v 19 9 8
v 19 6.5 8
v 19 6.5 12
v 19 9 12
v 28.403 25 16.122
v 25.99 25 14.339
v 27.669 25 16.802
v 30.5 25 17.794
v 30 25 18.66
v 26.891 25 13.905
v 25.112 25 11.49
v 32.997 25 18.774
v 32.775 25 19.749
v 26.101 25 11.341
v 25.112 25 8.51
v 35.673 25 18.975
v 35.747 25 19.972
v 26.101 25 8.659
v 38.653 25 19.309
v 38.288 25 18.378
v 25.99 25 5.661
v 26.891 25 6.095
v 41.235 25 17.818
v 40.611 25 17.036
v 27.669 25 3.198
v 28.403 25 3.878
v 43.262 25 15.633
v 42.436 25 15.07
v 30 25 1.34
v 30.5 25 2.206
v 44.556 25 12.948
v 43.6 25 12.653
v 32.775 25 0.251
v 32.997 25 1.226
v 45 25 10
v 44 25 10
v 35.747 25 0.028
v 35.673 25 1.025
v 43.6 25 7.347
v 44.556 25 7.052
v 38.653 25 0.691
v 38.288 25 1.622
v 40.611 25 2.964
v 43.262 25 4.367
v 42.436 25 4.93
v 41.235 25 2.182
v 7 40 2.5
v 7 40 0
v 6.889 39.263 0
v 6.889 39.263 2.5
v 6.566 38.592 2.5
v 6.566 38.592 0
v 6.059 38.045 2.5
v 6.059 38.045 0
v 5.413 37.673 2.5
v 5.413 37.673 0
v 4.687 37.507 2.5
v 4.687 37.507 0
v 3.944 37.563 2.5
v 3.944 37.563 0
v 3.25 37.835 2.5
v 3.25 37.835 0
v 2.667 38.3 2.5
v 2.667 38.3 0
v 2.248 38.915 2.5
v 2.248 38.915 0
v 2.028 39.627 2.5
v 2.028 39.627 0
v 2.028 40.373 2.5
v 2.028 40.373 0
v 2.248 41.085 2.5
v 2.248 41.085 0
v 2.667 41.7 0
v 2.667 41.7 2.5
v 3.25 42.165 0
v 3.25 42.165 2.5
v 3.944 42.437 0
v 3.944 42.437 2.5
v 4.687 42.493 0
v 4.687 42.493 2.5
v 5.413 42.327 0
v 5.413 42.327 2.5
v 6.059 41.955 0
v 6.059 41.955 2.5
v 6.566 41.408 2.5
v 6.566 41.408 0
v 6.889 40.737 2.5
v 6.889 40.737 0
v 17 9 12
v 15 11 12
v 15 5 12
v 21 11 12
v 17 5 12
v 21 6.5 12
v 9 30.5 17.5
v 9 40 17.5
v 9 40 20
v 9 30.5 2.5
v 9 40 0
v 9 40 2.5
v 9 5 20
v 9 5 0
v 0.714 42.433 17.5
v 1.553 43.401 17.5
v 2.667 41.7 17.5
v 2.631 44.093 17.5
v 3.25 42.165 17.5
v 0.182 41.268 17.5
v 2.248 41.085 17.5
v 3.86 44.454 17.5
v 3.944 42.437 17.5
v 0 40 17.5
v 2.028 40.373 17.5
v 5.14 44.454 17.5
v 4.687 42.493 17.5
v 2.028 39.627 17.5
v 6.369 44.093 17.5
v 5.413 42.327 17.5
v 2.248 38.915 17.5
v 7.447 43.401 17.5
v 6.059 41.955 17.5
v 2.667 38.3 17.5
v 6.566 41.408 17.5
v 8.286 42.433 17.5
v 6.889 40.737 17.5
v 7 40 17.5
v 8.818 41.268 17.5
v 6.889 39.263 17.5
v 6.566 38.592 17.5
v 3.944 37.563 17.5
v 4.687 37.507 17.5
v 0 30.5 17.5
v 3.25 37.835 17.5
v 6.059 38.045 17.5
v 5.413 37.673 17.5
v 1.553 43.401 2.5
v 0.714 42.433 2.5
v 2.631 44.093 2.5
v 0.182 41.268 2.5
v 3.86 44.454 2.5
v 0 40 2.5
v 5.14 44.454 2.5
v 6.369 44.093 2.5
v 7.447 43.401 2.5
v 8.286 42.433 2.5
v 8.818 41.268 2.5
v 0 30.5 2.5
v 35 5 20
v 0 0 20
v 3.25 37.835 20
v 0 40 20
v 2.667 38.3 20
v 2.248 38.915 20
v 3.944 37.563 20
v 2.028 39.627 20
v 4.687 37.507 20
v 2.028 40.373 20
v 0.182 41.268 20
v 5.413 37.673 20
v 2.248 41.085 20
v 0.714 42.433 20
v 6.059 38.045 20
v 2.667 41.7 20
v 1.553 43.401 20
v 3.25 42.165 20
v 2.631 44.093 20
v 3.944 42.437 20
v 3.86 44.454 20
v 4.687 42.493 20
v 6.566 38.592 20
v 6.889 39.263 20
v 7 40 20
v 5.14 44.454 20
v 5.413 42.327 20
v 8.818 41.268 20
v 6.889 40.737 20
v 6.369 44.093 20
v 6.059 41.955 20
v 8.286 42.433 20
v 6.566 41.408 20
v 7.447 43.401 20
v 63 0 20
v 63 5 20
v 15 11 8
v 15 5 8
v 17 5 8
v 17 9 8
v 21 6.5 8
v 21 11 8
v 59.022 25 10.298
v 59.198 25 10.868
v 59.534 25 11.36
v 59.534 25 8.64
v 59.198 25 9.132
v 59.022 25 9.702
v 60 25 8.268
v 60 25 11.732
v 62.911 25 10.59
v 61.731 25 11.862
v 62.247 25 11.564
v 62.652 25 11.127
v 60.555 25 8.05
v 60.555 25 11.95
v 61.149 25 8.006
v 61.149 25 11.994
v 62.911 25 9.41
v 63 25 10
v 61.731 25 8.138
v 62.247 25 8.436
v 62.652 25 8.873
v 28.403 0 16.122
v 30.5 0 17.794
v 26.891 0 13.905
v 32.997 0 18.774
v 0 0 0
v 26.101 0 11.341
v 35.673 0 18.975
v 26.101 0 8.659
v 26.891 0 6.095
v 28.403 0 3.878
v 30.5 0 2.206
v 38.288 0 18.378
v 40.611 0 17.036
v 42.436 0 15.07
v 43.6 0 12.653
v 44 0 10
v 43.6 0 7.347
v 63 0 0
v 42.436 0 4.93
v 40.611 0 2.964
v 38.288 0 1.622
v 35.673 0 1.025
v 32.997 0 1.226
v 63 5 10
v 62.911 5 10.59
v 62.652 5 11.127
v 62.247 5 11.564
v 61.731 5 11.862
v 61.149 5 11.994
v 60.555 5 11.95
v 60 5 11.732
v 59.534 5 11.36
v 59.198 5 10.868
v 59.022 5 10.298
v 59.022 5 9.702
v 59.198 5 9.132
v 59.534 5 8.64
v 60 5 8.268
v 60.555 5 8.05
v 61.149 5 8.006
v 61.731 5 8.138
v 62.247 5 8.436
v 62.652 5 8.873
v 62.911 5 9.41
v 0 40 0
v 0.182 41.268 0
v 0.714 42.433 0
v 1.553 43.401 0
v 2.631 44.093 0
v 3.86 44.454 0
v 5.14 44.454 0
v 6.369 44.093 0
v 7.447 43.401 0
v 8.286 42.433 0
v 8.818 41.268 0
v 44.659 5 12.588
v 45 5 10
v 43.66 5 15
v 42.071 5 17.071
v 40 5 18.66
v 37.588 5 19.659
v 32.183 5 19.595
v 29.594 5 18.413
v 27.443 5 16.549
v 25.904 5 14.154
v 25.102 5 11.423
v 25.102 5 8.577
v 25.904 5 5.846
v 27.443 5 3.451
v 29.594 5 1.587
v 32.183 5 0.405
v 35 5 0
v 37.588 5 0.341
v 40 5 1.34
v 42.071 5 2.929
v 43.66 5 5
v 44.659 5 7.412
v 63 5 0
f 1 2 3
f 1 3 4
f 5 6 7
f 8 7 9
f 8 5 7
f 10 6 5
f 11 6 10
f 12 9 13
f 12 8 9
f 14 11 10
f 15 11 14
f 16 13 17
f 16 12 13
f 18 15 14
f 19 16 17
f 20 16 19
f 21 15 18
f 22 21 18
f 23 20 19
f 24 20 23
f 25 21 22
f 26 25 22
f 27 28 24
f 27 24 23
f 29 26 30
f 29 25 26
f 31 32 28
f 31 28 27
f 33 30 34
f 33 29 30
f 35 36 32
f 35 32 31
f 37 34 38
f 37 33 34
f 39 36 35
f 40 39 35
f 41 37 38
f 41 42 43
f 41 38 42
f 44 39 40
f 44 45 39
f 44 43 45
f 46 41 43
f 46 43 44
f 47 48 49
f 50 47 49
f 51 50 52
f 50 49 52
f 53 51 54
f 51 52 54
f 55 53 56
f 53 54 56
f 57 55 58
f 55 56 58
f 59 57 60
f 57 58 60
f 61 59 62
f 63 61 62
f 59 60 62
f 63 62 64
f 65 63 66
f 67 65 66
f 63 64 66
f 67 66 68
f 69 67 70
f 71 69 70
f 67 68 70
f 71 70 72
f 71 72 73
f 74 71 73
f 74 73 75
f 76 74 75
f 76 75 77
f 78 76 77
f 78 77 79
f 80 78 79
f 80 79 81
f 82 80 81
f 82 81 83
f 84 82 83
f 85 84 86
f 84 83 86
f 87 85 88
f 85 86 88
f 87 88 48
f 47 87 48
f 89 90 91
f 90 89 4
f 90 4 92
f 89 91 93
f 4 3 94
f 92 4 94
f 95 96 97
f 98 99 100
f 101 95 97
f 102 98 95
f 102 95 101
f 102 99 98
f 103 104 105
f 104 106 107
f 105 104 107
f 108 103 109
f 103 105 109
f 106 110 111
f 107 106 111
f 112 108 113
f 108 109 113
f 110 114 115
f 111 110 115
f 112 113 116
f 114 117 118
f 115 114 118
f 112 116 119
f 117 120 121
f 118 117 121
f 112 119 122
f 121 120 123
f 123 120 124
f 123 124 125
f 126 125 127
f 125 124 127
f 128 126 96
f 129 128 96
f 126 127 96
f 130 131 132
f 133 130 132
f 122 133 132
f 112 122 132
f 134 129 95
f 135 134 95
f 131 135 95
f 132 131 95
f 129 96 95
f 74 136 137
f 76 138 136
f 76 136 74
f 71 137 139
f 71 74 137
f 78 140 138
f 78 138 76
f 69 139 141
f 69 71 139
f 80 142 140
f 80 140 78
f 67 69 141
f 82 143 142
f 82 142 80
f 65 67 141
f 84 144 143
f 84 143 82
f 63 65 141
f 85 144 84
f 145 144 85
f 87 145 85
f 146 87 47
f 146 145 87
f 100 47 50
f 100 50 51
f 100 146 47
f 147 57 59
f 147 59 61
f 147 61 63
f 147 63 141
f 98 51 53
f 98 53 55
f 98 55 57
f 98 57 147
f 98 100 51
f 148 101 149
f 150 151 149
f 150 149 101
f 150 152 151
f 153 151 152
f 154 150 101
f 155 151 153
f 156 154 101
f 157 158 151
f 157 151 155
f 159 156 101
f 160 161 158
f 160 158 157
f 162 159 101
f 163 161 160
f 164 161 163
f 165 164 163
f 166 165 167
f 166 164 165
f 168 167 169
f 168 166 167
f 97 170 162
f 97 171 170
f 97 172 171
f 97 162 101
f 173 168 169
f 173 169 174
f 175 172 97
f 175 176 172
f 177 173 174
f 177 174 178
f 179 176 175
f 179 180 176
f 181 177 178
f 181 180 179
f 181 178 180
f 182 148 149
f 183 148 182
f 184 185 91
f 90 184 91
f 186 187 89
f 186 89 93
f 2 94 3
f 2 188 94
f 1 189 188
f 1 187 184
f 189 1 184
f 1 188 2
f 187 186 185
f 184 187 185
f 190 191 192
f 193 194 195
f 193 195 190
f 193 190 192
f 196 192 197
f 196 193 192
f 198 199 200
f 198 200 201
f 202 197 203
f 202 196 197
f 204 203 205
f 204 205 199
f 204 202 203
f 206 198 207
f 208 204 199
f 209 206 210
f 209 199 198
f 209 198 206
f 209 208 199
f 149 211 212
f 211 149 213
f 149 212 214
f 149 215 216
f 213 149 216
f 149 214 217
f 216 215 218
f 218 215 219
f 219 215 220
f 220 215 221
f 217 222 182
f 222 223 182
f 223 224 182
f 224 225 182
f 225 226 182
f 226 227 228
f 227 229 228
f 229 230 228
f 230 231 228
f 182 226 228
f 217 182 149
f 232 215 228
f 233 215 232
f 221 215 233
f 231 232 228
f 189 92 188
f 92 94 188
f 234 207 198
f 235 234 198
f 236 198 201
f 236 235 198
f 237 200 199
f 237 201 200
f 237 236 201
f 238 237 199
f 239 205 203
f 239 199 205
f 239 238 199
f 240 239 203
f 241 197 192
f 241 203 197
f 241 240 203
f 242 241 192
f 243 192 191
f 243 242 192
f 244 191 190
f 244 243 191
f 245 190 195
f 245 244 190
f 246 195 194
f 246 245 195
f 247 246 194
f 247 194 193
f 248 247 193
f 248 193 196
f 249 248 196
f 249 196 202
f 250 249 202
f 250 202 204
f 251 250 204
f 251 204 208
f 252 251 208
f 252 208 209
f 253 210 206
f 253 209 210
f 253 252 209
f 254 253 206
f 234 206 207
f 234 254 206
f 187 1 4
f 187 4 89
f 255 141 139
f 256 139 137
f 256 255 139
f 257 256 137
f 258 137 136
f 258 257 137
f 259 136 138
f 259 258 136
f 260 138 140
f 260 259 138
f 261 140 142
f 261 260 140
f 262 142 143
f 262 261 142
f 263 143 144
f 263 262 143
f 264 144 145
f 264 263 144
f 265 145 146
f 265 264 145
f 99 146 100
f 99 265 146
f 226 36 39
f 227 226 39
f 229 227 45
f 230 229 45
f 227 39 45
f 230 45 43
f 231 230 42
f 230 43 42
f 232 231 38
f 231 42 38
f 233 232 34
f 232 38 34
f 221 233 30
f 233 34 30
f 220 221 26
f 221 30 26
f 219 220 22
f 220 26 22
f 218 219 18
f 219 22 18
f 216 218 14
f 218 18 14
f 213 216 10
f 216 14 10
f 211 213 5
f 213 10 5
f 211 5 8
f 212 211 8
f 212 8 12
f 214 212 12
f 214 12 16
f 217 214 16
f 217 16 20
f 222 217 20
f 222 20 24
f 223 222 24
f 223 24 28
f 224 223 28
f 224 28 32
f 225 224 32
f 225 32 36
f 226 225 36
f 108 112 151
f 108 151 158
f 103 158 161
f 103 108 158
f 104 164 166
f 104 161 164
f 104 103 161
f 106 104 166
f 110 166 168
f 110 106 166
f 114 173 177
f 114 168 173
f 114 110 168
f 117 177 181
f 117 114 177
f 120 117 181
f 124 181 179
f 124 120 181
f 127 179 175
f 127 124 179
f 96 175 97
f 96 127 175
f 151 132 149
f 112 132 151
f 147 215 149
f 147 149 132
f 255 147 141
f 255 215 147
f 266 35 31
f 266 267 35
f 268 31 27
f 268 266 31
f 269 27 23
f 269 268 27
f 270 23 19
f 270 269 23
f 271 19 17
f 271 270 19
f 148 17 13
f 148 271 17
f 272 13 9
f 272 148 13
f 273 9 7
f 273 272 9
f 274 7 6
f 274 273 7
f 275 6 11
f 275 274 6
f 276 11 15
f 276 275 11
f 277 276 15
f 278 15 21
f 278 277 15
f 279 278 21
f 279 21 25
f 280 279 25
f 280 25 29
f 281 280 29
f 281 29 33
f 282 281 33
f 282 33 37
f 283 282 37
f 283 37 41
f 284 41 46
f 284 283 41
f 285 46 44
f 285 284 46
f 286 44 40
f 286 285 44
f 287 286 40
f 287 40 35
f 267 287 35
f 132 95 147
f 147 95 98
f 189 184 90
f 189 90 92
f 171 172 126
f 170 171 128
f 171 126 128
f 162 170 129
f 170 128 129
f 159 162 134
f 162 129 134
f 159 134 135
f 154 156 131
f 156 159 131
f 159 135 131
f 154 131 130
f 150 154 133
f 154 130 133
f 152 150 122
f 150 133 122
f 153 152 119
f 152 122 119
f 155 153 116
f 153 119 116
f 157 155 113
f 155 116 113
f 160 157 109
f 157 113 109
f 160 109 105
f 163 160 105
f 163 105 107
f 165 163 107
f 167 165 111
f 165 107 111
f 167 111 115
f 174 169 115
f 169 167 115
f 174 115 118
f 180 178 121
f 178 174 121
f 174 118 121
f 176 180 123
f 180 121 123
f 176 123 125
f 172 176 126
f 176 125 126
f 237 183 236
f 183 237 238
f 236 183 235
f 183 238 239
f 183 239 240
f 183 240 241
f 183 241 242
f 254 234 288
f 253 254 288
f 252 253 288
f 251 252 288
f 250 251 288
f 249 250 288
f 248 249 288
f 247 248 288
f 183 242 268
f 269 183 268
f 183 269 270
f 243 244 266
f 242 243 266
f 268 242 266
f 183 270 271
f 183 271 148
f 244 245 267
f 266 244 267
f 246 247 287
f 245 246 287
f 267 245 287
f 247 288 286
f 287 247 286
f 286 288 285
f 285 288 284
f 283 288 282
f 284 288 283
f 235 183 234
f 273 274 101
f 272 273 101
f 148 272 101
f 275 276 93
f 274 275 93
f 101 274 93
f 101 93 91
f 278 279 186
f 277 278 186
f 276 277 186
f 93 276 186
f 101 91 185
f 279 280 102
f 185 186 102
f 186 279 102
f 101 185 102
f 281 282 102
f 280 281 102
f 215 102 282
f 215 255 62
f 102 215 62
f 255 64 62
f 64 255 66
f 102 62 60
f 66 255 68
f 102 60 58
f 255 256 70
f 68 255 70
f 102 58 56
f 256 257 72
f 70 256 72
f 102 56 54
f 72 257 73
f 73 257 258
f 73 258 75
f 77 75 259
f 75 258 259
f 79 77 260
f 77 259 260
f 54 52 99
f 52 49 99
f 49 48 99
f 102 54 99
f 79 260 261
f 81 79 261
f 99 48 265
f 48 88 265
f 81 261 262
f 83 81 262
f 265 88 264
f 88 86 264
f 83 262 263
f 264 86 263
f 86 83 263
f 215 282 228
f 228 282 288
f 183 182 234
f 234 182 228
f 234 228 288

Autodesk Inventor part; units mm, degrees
ref_plane "YZ Plane" through (0, 0, 0) normal (1, 0, 0) x (0, 1, 0)
ref_plane "XZ Plane" through (0, 0, 0) normal (0, 1, 0) x (-1, 0, 0)
ref_plane "XY Plane" through (0, 0, 0) normal (0, 0, 1) x (1, 0, 0)
sketch "Sketch1" plane through (0, 0, 0) normal (0, 0, 1) x (1, 0, 0)
  line L0 (0, 0) -> (0, 40)
  line L1 (0, 0) -> (63, 0)
  line L2 (63, 0) -> (63, 5)
  line L3 (63, 5) -> (9, 5)
  arc A0 (9, 40) -> (0, 40) centre (4.5, 40) ccw
  line L4 (9, 40) -> (9, 5)
  circle A1 centre (4.5, 40) radius 2.5
  dimension "d0" = 40
  dimension "d2" = 5
  dimension "d6" = 4.5
  dimension "d7" = 5
  dimension "d8" = 9
  dimension "d9" = 54
  dimension "d47" = 32.5
extrude "Extrusion1" add sketch "Sketch1" along normal blind 20
sketch "Sketch2" plane through (9, 5, 0) normal (0, 1, 0) x (1, 0, 0)
  line L0 (0, 0) -> (0, -20) projected
  circle A0 centre (26, -10) radius 10
  line L1 (0, 0) -> (54, 0) projected
  circle A1 centre (52, -10) radius 2
  line L2 (54, 0) -> (54, -20) projected
  point P0 (-9, 0)
  dimension "d14" = 20
  dimension "d16" = 26
  dimension "d20" = 4
  dimension "d21" = 10
  dimension "d22" = 14
sketch "Sketch6" plane through (9, 5, 0) normal (1, 0, 0) x (0, 0, -1)
  point P0 (0, -5)
sketch "Sketch7" plane through (9, 5, 0) normal (1, 0, 0) x (0, 0, -1)
  line L0 (-10, 41.0364) -> (-10, 39.6436)
  line L1 (0, 39.5) -> (-20, 39.5) projected
  line L2 (-2.5, 39.5) -> (-2.5, 25.5)
  line L3 (-17.5, 39.5) -> (-17.5, 25.5)
  line L4 (-17.5, 39.5) -> (-2.5, 39.5)
  line L5 (0, 32.5) -> (-20, 32.5) projected
  line L6 (-17.5, 25.5) -> (-2.5, 25.5)
  point P0 (0, -5)
  dimension "d40" = 14
  dimension "d41" = 14
  dimension "d42" = 15
extrude "Extrusion5" cut sketch "Sketch7" against normal blind 14
sketch "Sketch8" plane through (0, 0, 0) normal (0, 0, -1) x (-1, 0, 0)
  point P0 (0, 0)
extrude "Extrusion6" add sketch "Sketch2" along normal blind 20
sketch "Sketch9" plane through (35, 25, 10) normal (0, 1, 0) x (1, 0, 0)
  circle A0 centre (0, 0) radius 9
  point P0 (-35, 10)
  dimension "d50" = 18
extrude "Extrusion7" cut sketch "Sketch9" against normal blind 25
sketch "Sketch10" plane through (9, 5, 20) normal (0, 1, 0) x (1, 0, 0)
  line L0 (6, 8) -> (12, 8)
  line L1 (12, 8) -> (12, 12)
  line L2 (12, 12) -> (6, 12)
  line L3 (6, 12) -> (6, 8)
  line L4 (26, 0) -> (0, 0) projected
  line L5 (0, 2.5) -> (0, 17.5) projected
  point P0 (-9, 20)
  dimension "d53" = 6
  dimension "d54" = 4
  dimension "d55" = 8
  dimension "d56" = 6
extrude "Extrusion8" add sketch "Sketch10" along normal blind 6
sketch "Sketch11" plane through (21, 5, 8) normal (0, 0, -1) x (-1, 0, 0)
  line L0 (2, 4) -> (4, 4)
  line L1 (6, 0) -> (6, 6) projected
  line L2 (12, 0) -> (-14, 0) projected
  line L3 (0, 0) -> (6, 0)
  line L4 (0, 1.5) -> (0, 0)
  line L5 (6, 0) -> (0, 0)
  line L6 (0, 0) -> (3, 0)
  line L7 (0, 1.5) -> (2, 1.5)
  line L8 (2, 1.5) -> (2, 4)
  line L9 (3, 0) -> (0, 0)
  line L10 (4, 4) -> (4, 0)
  line L11 (0, 0) -> (6, 0) projected
  line L12 (0, 0) -> (4, 0)
  point P0 (21, -5)
  dimension "d59" = 2
  dimension "d60" = 2
  dimension "d61" = 4
  dimension "d62" = 1.5
extrude "Extrusion9" cut sketch "Sketch11" against normal blind 4
equation "\"d21\" = d19"
equation "\"d40\" = d41"
equation "\"d19\" = 0.5 * d14"
properties part number "ValveBaseMk2.3"
